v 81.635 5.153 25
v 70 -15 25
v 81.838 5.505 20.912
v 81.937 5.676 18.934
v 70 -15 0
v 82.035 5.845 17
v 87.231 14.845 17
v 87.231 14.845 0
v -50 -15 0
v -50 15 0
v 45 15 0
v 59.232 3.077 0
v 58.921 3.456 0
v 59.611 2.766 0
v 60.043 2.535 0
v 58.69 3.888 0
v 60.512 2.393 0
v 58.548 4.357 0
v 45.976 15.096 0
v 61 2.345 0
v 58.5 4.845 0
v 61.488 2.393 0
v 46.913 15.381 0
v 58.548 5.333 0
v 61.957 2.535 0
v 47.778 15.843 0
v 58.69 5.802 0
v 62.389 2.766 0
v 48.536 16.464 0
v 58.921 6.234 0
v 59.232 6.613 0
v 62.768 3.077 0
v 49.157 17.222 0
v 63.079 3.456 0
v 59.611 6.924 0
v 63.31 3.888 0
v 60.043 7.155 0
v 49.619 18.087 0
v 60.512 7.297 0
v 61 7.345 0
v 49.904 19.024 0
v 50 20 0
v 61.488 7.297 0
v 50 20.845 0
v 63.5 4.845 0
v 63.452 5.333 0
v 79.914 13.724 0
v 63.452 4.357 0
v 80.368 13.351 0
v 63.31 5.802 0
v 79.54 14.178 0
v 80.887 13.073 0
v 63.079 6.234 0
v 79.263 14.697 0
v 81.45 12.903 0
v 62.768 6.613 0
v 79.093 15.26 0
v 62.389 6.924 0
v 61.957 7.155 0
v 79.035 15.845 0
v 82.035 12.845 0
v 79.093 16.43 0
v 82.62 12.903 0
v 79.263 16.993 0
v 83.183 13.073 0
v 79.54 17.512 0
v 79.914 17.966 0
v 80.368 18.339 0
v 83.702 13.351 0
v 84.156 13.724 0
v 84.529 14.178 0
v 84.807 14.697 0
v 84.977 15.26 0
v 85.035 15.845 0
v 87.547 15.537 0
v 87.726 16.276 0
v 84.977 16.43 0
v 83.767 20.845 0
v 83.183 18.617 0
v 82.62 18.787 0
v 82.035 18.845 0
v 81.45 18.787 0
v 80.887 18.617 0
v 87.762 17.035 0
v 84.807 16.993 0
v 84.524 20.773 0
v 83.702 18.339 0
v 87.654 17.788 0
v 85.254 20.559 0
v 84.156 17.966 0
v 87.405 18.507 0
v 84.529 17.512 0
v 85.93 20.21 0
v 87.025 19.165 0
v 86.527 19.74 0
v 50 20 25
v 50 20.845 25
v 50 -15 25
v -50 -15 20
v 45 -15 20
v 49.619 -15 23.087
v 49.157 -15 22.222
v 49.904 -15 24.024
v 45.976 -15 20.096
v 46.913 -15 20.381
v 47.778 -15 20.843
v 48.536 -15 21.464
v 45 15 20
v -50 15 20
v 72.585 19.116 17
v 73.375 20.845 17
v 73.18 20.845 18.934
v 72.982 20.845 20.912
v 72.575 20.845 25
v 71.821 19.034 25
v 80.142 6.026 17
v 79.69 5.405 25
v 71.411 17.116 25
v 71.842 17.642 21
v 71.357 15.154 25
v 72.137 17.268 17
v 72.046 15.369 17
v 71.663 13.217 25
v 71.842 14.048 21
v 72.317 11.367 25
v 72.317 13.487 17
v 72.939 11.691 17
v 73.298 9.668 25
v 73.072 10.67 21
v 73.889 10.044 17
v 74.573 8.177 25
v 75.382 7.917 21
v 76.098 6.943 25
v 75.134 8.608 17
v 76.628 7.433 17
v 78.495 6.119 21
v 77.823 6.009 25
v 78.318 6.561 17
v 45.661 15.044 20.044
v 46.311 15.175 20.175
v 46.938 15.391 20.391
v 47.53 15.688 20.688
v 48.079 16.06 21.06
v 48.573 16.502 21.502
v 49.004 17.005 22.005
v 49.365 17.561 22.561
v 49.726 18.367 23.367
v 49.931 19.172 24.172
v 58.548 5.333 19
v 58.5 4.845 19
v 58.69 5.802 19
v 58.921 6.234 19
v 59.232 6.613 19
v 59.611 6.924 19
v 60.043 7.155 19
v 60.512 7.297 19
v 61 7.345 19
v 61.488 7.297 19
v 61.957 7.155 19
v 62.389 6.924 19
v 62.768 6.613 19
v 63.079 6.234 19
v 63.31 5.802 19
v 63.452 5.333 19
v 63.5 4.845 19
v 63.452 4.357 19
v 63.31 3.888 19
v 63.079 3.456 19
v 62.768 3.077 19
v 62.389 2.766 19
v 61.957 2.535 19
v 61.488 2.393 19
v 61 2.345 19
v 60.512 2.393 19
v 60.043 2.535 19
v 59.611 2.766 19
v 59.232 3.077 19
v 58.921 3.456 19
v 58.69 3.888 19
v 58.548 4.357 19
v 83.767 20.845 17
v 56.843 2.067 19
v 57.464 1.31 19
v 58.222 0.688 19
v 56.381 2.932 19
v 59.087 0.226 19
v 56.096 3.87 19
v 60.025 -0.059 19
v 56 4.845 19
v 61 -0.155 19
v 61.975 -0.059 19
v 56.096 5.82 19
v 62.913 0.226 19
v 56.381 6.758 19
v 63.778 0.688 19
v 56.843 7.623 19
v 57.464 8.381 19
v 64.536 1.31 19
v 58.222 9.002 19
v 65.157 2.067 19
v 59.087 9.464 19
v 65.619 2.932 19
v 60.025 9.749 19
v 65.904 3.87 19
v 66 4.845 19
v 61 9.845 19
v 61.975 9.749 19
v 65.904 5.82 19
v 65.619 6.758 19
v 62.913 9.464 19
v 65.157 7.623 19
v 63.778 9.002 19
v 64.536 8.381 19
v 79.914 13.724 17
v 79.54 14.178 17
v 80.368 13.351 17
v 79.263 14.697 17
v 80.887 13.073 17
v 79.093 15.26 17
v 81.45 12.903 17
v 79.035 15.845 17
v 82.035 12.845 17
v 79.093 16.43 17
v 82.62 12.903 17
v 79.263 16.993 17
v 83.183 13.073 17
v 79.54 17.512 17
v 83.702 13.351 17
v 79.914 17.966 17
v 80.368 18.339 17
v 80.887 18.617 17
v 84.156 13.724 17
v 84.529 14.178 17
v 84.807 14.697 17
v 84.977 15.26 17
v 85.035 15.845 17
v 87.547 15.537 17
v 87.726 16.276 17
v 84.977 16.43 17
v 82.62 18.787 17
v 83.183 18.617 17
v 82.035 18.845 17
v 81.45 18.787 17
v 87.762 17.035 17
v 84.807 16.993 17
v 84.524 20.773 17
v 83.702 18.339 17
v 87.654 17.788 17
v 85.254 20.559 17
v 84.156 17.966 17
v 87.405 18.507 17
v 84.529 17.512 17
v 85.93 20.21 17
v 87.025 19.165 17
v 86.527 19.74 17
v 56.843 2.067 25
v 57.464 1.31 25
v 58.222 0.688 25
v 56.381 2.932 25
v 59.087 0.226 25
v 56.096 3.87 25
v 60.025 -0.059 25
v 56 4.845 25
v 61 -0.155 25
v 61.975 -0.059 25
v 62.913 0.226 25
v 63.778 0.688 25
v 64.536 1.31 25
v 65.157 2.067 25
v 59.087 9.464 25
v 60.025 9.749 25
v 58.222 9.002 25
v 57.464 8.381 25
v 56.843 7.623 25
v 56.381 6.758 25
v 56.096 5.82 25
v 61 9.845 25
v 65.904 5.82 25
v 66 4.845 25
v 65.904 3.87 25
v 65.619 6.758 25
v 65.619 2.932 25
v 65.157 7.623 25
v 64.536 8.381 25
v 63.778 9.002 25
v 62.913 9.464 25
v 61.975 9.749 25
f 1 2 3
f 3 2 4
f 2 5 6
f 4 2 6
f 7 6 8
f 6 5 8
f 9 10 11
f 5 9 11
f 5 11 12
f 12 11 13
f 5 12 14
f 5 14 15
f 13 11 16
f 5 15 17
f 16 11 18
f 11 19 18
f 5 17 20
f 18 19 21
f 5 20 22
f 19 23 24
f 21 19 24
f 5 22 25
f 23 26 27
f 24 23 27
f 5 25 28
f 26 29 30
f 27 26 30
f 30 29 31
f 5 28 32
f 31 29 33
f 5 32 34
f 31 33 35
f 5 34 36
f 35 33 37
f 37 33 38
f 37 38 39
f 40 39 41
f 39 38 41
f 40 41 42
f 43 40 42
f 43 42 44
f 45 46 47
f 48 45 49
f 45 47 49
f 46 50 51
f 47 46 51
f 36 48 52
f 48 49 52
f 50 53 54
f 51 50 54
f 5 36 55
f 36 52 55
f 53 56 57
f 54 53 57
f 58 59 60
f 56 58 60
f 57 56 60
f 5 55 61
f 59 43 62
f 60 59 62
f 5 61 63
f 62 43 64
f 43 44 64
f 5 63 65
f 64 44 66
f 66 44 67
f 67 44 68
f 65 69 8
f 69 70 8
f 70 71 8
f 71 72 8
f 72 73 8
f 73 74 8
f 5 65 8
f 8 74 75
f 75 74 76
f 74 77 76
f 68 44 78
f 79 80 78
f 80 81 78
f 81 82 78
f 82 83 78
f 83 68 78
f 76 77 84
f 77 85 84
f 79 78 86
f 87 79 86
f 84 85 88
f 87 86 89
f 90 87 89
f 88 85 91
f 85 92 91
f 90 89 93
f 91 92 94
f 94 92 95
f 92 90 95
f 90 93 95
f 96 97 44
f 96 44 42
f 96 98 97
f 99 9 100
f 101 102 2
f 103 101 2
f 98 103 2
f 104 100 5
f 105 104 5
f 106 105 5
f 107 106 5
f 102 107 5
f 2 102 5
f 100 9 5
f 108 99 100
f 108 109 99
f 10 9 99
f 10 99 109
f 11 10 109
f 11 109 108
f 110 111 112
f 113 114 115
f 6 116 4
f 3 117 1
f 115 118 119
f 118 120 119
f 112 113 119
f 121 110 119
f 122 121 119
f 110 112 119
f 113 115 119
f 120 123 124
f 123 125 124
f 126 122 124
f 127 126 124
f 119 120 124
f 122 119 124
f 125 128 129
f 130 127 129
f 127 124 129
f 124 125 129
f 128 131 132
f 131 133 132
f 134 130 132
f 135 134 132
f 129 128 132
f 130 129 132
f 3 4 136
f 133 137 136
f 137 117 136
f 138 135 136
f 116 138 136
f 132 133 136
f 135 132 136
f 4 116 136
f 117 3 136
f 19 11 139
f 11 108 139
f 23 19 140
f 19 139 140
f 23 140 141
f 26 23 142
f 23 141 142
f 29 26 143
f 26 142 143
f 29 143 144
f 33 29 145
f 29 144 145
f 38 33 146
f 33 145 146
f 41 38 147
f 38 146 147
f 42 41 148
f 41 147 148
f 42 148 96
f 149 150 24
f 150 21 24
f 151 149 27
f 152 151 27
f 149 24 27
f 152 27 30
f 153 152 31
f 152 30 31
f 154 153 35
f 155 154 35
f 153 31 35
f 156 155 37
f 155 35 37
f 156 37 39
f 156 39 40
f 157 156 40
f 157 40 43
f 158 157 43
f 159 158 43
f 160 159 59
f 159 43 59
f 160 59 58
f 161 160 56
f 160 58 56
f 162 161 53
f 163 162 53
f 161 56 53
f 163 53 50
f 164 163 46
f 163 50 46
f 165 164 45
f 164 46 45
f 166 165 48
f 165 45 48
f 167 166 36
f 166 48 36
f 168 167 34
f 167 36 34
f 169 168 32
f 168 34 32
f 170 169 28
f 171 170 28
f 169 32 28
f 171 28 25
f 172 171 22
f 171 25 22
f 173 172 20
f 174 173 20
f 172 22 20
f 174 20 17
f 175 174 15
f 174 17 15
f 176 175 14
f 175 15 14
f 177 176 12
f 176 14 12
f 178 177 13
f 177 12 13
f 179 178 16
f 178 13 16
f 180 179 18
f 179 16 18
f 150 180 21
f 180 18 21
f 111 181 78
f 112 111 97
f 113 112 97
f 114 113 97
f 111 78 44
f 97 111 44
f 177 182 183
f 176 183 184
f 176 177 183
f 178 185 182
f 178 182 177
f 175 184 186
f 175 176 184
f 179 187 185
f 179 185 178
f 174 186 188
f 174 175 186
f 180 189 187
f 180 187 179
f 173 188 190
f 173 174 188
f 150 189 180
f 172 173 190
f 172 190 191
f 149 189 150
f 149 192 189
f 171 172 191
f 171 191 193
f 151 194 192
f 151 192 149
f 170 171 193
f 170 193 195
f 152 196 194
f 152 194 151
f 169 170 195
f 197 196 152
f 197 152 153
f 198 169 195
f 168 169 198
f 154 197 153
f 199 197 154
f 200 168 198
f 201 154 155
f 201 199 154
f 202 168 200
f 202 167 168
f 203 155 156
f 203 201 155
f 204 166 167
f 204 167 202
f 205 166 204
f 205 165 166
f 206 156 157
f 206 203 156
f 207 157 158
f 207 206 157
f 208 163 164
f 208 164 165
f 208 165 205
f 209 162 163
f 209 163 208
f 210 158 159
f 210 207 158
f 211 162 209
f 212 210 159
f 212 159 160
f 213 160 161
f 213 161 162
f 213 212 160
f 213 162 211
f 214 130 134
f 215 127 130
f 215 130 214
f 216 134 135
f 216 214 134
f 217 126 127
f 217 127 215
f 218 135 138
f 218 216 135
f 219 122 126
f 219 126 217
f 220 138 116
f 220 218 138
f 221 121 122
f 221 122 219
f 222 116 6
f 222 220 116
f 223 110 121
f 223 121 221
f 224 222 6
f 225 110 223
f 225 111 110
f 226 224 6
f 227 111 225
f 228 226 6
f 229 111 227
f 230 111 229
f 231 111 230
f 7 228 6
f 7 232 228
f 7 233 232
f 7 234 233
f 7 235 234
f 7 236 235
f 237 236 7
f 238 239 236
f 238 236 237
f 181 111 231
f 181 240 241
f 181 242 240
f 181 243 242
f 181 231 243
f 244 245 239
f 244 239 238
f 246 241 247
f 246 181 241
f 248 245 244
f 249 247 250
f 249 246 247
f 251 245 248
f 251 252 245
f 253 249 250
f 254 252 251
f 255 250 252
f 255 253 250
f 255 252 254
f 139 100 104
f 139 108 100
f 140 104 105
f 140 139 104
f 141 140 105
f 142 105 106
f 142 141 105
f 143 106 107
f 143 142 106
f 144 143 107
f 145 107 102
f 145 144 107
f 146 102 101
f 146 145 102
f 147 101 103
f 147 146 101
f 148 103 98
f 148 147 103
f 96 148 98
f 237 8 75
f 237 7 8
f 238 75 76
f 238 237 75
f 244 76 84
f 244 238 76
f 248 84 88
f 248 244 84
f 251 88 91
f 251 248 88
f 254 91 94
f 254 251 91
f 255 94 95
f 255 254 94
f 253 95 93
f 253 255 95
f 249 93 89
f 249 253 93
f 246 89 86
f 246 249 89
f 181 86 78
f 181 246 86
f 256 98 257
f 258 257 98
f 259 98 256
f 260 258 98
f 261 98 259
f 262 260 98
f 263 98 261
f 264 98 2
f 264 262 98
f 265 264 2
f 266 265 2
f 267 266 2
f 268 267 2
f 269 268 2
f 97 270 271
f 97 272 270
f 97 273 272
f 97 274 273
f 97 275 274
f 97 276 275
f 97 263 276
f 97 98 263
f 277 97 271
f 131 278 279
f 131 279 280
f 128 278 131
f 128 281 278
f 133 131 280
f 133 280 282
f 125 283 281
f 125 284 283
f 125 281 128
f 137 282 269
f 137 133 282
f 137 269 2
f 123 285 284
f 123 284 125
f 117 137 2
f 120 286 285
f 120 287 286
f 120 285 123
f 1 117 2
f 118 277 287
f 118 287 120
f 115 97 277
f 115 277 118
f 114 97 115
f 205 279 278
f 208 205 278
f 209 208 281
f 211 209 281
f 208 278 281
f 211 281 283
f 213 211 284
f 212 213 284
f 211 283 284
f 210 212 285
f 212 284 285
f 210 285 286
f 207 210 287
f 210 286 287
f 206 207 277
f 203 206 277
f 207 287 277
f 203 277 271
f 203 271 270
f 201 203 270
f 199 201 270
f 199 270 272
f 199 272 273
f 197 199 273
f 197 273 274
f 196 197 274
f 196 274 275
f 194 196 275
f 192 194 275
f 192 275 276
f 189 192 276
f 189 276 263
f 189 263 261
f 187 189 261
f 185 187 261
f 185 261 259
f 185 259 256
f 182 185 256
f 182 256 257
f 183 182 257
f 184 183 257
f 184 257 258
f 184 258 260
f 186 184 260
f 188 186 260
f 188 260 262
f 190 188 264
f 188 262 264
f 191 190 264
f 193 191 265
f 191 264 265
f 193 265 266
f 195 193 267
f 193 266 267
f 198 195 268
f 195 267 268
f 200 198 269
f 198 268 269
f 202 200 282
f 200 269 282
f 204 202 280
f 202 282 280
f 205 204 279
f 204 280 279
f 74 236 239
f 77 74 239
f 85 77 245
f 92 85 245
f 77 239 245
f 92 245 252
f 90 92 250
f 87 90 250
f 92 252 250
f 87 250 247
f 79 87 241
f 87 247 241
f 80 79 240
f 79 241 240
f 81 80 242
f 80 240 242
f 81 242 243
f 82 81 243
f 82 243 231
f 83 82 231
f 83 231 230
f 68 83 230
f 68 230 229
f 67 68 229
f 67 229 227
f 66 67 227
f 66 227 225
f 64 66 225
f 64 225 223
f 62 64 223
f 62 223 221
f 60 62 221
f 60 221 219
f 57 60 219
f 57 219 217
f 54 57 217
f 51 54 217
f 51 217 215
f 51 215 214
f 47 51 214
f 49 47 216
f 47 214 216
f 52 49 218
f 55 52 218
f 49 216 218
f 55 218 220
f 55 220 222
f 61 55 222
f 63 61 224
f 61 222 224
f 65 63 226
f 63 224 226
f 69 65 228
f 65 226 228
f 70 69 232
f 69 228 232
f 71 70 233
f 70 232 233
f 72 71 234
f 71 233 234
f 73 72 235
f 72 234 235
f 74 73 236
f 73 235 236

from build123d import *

# Parameters (mm, degrees)
SKETCH_1_W                = 100
SKETCH_1_H                = 30
EXTRUDE_1_DEPTH           = 20
EXTRUDE_2_DEPTH           = 5
EXTRUDE_2_DEPTH_BACK      = 20
FILLET_1_R                = 5
SKETCH_3_R                = 10
CUT_EXTRUDE_1_DEPTH       = 8
SKETCH_4_R                = 3
CUT_EXTRUDE_2_DEPTH       = 95.599814737
HOLE_WIZARD_1_D           = 5
HOLE_WIZARD_1_CBORE_D     = 10
HOLE_WIZARD_1_CBORE_DEPTH = 6
DRAFT_1_ANGLE             = 5
FILLET_2_R                = 4


with BuildPart() as part:
    # 草图1 → 凸台-拉伸1 (new body)
    with BuildSketch(Plane.XY):
        Rectangle(SKETCH_1_W, SKETCH_1_H)
    extrude(amount=EXTRUDE_1_DEPTH)

    # 草图2 → 凸台-拉伸2 (add, two sides: drawn at the far end of the back side and taken through both)
    with BuildSketch(Plane.XY.offset(20).offset(-EXTRUDE_2_DEPTH_BACK)):
        Polygon((50, -15), (70, -15), (90.695144291, 20.845041382), (50, 20.845041382), align=None)
    extrude(amount=EXTRUDE_2_DEPTH + EXTRUDE_2_DEPTH_BACK)

    # 圆角1
    fillet_1_edges = [part.edges().sort_by_distance(p)[0] for p in [
        (50, 15, 10),
        (50, 0, 20),
    ]]
    fillet(fillet_1_edges, radius=FILLET_1_R - 0.0001)  # a hair under: the kernel refuses the full size

    # 草图3 → 切除-拉伸1 (cut)
    with BuildSketch(Plane.XY.offset(25)):
        with Locations((82.034890253, 15.845041382)):
            Circle(SKETCH_3_R)
    extrude(amount=-CUT_EXTRUDE_1_DEPTH, mode=Mode.SUBTRACT)

    # 草图4 → 切除-拉伸2 (cut, through all)
    with BuildSketch(Plane.XY.offset(17)):
        with Locations((82.034890253, 15.845041382)):
            Circle(SKETCH_4_R)
    extrude(amount=-CUT_EXTRUDE_2_DEPTH, mode=Mode.SUBTRACT)

    # 孔1 (through all)
    with Locations(Plane(origin=(61, 4.845041382, 25), x_dir=(1, 0, 0), z_dir=(0, 0, 1))):
        with Locations((0, 0)):
            CounterBoreHole(HOLE_WIZARD_1_D / 2, HOLE_WIZARD_1_CBORE_D / 2, HOLE_WIZARD_1_CBORE_DEPTH)

    # 拔模1
    draft_1_faces = [part.faces().sort_by_distance(p)[0] for p in [
        (73.374636215, 10.845041382, 21),
    ]]
    draft(draft_1_faces, Plane(origin=(82.034890253, 15.845041382, 17), x_dir=(1, 0, 0), z_dir=(0, 0, 1)), DRAFT_1_ANGLE)

    # 圆角2
    fillet_2_edges = [part.edges().sort_by_distance(p)[0] for p in [
        (90.695144291, 20.845041382, 8.5),
    ]]
    fillet(fillet_2_edges, radius=FILLET_2_R)


solid = part.part
